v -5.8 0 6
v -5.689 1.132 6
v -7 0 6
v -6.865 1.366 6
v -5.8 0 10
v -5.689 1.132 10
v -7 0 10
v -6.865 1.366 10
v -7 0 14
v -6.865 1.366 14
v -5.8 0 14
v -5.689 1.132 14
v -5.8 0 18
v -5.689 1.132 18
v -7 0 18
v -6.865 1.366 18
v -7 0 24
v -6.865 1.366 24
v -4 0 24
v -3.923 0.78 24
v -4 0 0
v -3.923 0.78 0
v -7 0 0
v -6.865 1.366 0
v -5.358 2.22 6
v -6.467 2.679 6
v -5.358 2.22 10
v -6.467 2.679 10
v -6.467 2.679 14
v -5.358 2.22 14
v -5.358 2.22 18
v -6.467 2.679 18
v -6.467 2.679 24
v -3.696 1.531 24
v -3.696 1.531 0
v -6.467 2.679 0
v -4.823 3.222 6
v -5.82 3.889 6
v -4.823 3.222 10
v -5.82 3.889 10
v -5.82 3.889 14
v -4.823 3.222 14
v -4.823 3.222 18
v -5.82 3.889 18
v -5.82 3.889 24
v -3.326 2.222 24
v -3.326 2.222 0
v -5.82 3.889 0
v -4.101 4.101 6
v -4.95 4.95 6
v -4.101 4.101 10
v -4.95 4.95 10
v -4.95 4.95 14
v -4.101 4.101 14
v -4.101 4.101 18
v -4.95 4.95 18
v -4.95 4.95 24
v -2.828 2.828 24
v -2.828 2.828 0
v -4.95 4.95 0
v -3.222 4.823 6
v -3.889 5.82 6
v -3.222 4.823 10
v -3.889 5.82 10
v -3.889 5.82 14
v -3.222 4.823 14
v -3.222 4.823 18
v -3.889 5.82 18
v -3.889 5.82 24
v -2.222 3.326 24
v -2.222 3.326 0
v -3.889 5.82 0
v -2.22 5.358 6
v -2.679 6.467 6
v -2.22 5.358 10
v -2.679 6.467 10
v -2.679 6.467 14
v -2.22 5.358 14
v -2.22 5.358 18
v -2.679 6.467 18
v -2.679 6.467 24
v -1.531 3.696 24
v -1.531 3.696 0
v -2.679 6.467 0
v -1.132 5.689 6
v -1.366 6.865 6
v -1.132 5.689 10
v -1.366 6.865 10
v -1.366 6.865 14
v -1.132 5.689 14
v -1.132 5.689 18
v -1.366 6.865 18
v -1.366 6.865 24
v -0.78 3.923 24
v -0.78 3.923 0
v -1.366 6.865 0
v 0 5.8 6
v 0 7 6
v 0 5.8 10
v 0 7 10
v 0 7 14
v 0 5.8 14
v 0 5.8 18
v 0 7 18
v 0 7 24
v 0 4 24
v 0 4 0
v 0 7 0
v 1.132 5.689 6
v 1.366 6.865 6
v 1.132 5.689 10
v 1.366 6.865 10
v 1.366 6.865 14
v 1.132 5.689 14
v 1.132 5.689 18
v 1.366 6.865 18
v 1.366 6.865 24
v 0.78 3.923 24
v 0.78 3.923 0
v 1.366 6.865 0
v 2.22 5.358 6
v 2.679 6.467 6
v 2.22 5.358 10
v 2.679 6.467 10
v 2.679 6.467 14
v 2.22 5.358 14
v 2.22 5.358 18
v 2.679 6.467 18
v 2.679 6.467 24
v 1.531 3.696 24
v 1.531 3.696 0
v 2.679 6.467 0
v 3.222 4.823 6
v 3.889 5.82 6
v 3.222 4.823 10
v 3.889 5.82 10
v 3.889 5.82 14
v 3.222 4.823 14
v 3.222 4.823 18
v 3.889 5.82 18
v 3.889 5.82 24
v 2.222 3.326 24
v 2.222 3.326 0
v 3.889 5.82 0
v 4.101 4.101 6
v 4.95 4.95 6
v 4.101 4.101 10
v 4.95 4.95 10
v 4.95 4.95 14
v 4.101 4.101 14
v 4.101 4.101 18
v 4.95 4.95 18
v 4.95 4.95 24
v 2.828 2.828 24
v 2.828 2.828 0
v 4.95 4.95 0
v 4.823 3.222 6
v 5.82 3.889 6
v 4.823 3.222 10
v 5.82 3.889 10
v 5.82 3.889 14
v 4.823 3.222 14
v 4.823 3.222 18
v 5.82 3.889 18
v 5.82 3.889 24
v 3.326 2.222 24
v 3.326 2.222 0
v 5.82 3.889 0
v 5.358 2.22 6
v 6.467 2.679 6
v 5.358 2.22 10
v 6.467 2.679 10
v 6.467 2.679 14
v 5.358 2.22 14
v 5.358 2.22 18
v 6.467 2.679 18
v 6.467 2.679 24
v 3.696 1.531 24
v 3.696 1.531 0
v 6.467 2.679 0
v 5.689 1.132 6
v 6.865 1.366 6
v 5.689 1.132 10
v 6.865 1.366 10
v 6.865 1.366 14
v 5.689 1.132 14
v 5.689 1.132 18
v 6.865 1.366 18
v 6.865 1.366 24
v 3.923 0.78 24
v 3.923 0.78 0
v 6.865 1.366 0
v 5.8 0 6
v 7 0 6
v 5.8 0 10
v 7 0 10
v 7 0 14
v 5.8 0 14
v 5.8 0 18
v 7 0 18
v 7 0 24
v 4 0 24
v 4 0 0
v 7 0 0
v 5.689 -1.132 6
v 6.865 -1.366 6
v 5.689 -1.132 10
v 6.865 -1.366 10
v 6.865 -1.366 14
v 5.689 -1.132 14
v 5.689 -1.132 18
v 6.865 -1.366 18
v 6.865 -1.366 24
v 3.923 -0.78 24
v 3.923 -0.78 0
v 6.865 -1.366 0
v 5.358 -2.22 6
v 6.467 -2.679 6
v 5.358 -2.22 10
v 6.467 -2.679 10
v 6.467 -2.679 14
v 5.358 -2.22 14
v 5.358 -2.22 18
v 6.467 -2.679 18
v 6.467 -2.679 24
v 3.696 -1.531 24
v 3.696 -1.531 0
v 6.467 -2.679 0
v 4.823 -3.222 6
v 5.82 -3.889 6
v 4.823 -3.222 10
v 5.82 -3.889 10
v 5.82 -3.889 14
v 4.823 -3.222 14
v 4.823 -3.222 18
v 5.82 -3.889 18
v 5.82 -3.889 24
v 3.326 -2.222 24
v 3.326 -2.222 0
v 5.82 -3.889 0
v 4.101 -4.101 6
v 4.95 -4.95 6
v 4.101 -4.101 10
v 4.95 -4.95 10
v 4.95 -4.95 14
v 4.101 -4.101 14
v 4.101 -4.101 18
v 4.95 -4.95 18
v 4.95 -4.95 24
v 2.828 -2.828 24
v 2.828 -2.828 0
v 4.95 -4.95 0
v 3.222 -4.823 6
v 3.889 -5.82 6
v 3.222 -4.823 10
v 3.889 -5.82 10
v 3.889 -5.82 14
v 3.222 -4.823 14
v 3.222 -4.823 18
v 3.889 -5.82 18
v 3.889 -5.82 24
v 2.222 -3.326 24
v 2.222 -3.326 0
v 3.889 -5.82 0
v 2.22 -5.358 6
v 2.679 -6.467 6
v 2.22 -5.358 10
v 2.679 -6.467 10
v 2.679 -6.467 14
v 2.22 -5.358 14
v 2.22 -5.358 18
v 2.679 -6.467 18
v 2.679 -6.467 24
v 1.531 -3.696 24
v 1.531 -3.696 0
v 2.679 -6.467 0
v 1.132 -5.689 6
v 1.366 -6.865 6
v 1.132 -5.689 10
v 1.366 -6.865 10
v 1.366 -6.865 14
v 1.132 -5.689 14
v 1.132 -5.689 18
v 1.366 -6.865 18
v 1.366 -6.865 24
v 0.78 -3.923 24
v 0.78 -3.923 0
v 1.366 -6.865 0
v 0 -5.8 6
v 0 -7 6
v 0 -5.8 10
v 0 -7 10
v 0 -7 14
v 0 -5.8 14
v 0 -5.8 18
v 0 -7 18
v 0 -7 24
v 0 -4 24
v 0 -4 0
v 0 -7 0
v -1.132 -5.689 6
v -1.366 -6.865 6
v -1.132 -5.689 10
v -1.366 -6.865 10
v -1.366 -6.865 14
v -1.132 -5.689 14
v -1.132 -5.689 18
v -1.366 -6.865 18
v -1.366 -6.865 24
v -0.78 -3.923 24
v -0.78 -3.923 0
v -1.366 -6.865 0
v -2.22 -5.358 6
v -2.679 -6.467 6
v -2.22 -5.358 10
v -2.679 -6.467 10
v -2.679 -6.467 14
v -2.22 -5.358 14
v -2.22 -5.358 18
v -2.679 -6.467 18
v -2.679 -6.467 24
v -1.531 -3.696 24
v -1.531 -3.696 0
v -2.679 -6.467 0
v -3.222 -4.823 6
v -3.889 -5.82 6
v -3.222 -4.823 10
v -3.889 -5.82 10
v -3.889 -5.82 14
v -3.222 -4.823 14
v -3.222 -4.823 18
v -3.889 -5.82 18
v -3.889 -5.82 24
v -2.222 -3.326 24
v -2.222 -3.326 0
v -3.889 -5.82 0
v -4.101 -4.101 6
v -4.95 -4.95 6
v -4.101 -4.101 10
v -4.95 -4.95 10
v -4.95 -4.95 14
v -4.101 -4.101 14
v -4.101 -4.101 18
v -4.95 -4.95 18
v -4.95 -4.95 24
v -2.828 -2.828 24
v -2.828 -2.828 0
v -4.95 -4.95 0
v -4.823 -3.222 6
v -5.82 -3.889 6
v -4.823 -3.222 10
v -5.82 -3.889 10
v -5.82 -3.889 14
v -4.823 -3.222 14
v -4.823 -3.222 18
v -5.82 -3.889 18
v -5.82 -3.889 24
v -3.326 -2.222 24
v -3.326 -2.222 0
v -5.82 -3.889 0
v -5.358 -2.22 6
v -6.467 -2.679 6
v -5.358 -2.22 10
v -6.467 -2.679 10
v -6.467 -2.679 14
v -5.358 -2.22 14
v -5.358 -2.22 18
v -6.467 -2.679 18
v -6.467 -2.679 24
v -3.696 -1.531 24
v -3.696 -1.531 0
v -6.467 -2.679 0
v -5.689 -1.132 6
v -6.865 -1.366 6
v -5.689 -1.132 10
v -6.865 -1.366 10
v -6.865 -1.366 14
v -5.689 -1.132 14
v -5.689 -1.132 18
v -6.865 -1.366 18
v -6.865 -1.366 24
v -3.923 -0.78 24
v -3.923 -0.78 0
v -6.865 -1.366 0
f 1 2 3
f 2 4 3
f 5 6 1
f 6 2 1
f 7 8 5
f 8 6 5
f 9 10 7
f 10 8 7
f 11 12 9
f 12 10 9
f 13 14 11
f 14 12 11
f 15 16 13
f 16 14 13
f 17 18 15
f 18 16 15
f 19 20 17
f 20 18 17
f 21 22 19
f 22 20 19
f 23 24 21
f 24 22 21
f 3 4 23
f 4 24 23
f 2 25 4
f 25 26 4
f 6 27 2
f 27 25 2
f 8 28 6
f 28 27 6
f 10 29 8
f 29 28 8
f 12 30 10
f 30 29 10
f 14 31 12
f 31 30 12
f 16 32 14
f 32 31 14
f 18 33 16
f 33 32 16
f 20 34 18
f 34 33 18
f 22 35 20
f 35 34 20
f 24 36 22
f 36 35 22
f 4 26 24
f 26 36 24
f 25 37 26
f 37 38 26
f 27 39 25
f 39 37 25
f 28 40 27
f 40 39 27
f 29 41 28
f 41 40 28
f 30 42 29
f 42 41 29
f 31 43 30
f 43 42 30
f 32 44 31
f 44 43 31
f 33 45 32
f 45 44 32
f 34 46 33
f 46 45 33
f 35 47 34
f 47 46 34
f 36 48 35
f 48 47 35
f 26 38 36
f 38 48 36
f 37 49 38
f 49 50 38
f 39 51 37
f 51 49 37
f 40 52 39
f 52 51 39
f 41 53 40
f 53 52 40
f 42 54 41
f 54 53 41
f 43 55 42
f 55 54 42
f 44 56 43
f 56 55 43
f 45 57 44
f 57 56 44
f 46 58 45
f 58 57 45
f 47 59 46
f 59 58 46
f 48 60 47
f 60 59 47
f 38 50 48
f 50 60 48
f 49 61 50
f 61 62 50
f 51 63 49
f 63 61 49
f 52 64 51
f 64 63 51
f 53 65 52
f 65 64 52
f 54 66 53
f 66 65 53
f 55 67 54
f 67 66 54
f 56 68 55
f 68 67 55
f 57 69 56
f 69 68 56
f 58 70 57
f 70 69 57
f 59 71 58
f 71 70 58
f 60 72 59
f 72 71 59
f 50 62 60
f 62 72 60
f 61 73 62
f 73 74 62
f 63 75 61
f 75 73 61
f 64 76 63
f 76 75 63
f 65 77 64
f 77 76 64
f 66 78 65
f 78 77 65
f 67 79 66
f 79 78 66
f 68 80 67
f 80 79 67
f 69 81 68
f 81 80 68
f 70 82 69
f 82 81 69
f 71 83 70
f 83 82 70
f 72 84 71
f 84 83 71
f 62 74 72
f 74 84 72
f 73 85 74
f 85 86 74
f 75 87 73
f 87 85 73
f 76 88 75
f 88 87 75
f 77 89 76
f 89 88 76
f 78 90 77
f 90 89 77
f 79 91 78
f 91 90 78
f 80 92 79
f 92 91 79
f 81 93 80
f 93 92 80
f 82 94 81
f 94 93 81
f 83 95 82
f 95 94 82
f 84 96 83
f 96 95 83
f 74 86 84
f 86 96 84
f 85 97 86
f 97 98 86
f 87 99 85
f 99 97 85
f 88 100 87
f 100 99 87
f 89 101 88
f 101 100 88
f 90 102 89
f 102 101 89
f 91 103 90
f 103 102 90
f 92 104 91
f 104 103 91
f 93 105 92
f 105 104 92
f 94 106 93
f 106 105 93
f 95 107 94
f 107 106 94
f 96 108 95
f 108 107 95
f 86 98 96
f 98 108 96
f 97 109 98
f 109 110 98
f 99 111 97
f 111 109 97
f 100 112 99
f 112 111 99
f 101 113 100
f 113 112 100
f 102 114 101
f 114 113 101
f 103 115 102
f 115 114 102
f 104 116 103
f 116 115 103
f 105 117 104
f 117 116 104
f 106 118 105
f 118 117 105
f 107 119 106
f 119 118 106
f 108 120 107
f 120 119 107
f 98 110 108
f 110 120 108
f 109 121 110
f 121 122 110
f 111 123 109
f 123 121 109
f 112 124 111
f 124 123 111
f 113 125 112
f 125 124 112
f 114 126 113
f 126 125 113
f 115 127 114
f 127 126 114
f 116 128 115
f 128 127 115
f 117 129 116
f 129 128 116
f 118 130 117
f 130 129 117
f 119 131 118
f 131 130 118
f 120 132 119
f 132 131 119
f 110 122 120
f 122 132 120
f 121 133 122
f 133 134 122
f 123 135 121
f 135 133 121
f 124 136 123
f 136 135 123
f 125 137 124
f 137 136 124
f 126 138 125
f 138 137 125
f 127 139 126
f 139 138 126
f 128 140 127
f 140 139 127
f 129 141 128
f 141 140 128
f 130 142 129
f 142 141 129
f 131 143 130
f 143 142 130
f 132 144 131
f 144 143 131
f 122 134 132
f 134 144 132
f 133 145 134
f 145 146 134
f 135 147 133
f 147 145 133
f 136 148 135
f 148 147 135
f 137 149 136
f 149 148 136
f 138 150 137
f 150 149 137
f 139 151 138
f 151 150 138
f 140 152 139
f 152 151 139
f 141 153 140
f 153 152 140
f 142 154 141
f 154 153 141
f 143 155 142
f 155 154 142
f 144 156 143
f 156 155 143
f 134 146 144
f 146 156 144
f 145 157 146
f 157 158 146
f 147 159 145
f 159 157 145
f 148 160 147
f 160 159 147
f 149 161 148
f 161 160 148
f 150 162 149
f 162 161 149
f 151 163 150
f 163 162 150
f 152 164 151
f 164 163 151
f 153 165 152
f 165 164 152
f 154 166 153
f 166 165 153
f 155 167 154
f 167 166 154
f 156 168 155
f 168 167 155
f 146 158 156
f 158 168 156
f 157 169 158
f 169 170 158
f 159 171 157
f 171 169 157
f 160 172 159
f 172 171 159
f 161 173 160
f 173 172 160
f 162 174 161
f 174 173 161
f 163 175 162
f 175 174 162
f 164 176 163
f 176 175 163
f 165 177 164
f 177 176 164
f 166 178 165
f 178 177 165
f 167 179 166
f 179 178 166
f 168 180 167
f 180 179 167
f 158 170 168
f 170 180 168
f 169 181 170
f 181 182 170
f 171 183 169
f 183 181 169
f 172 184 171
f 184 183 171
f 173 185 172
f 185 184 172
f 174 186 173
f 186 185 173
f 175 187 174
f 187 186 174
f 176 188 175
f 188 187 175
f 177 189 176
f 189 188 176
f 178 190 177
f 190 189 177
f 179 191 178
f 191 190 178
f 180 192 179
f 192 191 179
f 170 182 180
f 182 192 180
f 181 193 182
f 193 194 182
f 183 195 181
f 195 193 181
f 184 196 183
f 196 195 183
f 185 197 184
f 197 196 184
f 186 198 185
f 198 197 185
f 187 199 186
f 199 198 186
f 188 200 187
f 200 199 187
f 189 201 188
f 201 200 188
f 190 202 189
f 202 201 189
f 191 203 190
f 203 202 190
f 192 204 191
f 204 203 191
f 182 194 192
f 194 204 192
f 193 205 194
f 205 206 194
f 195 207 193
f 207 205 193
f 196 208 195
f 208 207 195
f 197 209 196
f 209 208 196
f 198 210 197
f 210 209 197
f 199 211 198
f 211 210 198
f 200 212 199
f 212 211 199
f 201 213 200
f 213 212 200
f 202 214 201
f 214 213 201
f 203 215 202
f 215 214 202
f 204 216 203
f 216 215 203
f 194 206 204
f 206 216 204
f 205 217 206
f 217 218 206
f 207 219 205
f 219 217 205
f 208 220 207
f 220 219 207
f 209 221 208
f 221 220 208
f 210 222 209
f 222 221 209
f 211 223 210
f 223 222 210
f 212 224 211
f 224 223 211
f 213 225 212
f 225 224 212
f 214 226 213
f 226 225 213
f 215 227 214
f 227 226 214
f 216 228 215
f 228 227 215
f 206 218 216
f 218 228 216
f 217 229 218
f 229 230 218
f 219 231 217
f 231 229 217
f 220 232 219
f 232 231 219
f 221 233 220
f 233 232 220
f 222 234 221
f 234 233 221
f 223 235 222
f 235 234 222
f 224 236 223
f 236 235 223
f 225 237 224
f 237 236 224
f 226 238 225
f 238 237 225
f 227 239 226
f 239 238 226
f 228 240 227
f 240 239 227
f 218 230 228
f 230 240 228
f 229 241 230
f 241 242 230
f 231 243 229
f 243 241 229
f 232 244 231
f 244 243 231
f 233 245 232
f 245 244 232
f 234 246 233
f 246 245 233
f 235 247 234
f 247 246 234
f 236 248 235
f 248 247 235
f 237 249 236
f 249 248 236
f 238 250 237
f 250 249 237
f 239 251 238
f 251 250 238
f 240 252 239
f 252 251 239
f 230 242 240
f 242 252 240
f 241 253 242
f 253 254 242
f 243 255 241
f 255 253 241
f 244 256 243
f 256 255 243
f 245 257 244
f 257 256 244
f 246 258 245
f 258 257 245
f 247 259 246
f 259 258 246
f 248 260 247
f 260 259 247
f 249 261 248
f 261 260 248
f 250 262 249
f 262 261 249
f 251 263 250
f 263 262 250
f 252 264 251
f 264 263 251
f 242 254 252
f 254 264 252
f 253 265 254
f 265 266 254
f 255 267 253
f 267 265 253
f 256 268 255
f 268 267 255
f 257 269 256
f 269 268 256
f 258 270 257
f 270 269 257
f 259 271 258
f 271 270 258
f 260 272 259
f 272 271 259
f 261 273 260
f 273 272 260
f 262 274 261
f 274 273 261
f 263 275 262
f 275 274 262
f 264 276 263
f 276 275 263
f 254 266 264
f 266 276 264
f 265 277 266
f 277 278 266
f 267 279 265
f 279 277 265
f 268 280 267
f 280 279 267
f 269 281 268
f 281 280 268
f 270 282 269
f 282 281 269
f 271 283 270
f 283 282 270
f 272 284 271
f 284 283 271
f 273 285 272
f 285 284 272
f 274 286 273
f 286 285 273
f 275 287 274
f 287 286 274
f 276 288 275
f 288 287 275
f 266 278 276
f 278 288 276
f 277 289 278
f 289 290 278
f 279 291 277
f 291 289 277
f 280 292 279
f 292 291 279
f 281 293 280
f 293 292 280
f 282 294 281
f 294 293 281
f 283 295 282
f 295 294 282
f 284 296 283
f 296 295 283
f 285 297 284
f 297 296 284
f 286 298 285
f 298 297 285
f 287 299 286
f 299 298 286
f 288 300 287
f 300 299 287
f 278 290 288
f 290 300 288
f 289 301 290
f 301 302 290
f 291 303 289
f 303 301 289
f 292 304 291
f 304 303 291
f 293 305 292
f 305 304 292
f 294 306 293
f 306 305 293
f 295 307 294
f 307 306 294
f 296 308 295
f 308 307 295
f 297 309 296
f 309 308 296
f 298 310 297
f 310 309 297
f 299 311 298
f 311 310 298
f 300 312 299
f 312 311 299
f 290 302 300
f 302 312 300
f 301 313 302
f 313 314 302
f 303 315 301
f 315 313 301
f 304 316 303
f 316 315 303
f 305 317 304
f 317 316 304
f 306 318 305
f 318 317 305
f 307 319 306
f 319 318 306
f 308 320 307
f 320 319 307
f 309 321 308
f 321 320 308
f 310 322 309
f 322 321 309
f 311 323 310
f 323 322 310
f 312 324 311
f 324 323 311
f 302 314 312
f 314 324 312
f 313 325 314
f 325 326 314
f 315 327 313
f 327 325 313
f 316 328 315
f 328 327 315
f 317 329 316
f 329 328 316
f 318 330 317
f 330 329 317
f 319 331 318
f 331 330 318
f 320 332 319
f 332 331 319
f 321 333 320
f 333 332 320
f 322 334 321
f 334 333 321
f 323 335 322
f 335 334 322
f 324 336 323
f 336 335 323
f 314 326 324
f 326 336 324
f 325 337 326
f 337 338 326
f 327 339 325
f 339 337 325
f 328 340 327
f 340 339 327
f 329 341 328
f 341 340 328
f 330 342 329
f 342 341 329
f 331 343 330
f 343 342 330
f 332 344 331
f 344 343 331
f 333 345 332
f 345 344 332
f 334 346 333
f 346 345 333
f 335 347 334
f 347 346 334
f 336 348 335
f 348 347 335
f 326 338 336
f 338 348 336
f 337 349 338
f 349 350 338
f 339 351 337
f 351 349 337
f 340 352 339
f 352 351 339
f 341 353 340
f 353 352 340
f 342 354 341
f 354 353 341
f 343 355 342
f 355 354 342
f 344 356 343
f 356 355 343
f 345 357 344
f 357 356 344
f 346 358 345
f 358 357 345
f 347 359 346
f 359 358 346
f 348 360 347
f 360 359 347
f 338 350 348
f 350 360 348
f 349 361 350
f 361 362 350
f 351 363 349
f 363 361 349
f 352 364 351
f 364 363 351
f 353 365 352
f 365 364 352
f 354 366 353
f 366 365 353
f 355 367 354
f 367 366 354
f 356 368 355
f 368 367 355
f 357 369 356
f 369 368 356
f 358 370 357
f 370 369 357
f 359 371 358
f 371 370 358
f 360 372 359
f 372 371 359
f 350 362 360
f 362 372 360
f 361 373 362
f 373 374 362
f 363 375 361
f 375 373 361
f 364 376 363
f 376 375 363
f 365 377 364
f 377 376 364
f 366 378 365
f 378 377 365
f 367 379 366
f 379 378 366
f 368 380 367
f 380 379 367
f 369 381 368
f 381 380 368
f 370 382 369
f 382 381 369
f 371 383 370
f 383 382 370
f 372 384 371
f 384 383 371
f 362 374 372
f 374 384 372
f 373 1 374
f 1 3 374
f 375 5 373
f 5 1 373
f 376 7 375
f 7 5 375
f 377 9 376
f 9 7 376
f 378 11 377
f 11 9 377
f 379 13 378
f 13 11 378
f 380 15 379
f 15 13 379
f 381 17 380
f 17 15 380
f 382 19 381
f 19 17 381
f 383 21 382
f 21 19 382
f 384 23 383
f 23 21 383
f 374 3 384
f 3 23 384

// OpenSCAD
$fn = 32;

// ----------------------------------------------------------------------
// Grooved revolve: stepped, bore R4
// ----------------------------------------------------------------------

// --- parameters (mm) ---
bore_r = 4;               // bore radius
outer_r = 7;              // outer radius of the body
total_h = 24;             // overall height, Z
wall = 3;                 // radial wall thickness
groove_w = 4;             // groove width
groove_d = 1.2;           // groove depth
grooves = 2;              // number of outer grooves

bbox_x = 2 * outer_r;  // full diameter
bore_d = 2 * bore_r;  // bore diameter
body_d = 2 * outer_r;  // body diameter
revolve_angle = 360;  // full turn around the Z axis

profile = [[4, 0], [7, 0], [7, 6], [5.8, 6], [5.8, 10], [7, 10], [7, 14], [5.8, 14], [5.8, 18], [7, 18], [7, 24], [4, 24]];  // primary outline, 12 points, counter clockwise

// --- the one profile operation ---
rotate_extrude(angle = revolve_angle) polygon(points = profile);
